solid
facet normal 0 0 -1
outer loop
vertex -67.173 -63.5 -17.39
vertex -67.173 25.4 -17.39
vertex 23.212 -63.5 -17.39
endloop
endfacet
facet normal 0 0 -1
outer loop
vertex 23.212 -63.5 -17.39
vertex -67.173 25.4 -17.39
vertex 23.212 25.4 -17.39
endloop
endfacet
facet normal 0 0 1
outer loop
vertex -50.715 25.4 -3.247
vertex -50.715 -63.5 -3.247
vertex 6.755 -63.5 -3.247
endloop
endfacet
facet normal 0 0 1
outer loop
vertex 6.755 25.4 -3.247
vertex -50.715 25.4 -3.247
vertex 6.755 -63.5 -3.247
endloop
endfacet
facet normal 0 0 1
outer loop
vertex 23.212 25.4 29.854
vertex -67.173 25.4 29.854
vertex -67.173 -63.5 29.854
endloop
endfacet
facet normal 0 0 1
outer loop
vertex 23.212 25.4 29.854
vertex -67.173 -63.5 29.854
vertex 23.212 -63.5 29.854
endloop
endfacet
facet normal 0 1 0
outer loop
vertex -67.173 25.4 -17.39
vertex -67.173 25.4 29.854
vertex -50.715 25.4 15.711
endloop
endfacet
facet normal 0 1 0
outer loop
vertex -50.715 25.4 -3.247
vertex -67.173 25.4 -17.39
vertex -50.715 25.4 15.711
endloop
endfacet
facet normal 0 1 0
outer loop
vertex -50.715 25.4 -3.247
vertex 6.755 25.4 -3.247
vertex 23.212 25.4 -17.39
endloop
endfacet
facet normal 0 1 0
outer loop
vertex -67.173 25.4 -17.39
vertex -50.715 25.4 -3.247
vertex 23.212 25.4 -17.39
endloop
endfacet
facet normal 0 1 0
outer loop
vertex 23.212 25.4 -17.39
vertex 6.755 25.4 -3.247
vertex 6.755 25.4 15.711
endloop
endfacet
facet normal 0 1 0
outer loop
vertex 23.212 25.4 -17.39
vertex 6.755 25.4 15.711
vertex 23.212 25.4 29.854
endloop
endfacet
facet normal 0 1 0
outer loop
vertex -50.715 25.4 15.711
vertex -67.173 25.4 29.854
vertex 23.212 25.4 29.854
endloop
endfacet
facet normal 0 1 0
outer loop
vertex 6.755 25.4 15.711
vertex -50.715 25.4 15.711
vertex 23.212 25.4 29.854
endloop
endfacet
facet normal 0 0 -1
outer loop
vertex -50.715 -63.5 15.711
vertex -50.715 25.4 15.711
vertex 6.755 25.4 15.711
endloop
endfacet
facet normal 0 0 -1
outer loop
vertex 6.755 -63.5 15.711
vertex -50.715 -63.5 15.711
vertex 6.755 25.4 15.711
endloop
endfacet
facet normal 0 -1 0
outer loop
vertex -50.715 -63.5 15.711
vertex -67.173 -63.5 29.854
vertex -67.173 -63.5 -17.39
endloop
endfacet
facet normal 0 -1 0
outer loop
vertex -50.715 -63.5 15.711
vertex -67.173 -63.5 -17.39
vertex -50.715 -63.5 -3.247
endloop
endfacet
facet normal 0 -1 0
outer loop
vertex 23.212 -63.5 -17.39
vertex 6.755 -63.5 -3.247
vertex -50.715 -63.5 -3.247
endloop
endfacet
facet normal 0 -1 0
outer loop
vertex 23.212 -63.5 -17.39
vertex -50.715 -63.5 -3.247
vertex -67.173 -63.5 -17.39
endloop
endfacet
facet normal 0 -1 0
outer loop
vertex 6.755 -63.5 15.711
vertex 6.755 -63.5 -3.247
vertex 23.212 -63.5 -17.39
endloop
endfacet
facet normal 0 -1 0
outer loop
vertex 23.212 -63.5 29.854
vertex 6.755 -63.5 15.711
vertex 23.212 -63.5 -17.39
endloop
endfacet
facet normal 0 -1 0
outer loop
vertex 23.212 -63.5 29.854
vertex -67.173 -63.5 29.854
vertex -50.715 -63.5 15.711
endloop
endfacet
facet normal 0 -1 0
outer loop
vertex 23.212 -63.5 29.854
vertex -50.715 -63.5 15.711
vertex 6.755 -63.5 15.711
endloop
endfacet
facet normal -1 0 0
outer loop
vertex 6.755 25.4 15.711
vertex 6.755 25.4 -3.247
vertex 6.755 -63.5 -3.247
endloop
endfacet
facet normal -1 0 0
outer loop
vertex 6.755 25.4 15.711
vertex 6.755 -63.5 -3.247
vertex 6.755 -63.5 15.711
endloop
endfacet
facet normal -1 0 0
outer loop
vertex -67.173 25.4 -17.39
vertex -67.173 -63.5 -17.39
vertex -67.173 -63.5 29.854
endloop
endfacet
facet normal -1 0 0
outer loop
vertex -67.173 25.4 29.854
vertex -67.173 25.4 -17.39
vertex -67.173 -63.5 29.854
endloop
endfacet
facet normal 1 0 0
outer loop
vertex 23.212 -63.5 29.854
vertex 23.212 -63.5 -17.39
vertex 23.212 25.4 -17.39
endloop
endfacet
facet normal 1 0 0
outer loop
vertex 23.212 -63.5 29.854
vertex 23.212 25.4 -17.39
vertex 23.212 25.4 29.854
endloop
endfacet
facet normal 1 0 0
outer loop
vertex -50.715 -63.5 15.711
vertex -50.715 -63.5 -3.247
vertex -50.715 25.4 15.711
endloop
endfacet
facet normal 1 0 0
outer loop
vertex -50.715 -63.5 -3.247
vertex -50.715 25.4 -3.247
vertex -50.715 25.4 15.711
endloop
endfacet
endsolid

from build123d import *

# Parameters (mm, degrees)
F0_W     = 90.384428855
F0_H     = 47.2447103821
F0_W_2   = 57.4698699638
F0_H_2   = 18.9575916156
F1_DEPTH = 25.4
F2_DEPTH = 25.4
F3_DEPTH = 12.7


with BuildPart() as f1:
    # F0 (on Front) → F1 (new body, symmetric)
    with BuildSketch(Plane.XZ):
        with Locations((-21.9803575892, 6.2321212608)):
            Rectangle(F0_W, F0_H)
        with Locations((-21.9803575892, 6.2321212608)):
            Rectangle(F0_W_2, F0_H_2, mode=Mode.SUBTRACT)
    extrude(amount=F1_DEPTH, both=True)

    # F2 (add): a face of the model
    f2_faces = [f1.faces().sort_by_distance(p)[0] for p in [
        (-21.9803575892, -25.4, 28.8346035363),
    ]]
    extrude(f2_faces, amount=F2_DEPTH)

    # F3 (add): a face of the model
    f3_faces = [f1.faces().sort_by_distance(p)[0] for p in [
        (-21.9803575892, -50.8, 28.8346035363),
    ]]
    extrude(f3_faces, amount=F3_DEPTH)


solid = f1.part
